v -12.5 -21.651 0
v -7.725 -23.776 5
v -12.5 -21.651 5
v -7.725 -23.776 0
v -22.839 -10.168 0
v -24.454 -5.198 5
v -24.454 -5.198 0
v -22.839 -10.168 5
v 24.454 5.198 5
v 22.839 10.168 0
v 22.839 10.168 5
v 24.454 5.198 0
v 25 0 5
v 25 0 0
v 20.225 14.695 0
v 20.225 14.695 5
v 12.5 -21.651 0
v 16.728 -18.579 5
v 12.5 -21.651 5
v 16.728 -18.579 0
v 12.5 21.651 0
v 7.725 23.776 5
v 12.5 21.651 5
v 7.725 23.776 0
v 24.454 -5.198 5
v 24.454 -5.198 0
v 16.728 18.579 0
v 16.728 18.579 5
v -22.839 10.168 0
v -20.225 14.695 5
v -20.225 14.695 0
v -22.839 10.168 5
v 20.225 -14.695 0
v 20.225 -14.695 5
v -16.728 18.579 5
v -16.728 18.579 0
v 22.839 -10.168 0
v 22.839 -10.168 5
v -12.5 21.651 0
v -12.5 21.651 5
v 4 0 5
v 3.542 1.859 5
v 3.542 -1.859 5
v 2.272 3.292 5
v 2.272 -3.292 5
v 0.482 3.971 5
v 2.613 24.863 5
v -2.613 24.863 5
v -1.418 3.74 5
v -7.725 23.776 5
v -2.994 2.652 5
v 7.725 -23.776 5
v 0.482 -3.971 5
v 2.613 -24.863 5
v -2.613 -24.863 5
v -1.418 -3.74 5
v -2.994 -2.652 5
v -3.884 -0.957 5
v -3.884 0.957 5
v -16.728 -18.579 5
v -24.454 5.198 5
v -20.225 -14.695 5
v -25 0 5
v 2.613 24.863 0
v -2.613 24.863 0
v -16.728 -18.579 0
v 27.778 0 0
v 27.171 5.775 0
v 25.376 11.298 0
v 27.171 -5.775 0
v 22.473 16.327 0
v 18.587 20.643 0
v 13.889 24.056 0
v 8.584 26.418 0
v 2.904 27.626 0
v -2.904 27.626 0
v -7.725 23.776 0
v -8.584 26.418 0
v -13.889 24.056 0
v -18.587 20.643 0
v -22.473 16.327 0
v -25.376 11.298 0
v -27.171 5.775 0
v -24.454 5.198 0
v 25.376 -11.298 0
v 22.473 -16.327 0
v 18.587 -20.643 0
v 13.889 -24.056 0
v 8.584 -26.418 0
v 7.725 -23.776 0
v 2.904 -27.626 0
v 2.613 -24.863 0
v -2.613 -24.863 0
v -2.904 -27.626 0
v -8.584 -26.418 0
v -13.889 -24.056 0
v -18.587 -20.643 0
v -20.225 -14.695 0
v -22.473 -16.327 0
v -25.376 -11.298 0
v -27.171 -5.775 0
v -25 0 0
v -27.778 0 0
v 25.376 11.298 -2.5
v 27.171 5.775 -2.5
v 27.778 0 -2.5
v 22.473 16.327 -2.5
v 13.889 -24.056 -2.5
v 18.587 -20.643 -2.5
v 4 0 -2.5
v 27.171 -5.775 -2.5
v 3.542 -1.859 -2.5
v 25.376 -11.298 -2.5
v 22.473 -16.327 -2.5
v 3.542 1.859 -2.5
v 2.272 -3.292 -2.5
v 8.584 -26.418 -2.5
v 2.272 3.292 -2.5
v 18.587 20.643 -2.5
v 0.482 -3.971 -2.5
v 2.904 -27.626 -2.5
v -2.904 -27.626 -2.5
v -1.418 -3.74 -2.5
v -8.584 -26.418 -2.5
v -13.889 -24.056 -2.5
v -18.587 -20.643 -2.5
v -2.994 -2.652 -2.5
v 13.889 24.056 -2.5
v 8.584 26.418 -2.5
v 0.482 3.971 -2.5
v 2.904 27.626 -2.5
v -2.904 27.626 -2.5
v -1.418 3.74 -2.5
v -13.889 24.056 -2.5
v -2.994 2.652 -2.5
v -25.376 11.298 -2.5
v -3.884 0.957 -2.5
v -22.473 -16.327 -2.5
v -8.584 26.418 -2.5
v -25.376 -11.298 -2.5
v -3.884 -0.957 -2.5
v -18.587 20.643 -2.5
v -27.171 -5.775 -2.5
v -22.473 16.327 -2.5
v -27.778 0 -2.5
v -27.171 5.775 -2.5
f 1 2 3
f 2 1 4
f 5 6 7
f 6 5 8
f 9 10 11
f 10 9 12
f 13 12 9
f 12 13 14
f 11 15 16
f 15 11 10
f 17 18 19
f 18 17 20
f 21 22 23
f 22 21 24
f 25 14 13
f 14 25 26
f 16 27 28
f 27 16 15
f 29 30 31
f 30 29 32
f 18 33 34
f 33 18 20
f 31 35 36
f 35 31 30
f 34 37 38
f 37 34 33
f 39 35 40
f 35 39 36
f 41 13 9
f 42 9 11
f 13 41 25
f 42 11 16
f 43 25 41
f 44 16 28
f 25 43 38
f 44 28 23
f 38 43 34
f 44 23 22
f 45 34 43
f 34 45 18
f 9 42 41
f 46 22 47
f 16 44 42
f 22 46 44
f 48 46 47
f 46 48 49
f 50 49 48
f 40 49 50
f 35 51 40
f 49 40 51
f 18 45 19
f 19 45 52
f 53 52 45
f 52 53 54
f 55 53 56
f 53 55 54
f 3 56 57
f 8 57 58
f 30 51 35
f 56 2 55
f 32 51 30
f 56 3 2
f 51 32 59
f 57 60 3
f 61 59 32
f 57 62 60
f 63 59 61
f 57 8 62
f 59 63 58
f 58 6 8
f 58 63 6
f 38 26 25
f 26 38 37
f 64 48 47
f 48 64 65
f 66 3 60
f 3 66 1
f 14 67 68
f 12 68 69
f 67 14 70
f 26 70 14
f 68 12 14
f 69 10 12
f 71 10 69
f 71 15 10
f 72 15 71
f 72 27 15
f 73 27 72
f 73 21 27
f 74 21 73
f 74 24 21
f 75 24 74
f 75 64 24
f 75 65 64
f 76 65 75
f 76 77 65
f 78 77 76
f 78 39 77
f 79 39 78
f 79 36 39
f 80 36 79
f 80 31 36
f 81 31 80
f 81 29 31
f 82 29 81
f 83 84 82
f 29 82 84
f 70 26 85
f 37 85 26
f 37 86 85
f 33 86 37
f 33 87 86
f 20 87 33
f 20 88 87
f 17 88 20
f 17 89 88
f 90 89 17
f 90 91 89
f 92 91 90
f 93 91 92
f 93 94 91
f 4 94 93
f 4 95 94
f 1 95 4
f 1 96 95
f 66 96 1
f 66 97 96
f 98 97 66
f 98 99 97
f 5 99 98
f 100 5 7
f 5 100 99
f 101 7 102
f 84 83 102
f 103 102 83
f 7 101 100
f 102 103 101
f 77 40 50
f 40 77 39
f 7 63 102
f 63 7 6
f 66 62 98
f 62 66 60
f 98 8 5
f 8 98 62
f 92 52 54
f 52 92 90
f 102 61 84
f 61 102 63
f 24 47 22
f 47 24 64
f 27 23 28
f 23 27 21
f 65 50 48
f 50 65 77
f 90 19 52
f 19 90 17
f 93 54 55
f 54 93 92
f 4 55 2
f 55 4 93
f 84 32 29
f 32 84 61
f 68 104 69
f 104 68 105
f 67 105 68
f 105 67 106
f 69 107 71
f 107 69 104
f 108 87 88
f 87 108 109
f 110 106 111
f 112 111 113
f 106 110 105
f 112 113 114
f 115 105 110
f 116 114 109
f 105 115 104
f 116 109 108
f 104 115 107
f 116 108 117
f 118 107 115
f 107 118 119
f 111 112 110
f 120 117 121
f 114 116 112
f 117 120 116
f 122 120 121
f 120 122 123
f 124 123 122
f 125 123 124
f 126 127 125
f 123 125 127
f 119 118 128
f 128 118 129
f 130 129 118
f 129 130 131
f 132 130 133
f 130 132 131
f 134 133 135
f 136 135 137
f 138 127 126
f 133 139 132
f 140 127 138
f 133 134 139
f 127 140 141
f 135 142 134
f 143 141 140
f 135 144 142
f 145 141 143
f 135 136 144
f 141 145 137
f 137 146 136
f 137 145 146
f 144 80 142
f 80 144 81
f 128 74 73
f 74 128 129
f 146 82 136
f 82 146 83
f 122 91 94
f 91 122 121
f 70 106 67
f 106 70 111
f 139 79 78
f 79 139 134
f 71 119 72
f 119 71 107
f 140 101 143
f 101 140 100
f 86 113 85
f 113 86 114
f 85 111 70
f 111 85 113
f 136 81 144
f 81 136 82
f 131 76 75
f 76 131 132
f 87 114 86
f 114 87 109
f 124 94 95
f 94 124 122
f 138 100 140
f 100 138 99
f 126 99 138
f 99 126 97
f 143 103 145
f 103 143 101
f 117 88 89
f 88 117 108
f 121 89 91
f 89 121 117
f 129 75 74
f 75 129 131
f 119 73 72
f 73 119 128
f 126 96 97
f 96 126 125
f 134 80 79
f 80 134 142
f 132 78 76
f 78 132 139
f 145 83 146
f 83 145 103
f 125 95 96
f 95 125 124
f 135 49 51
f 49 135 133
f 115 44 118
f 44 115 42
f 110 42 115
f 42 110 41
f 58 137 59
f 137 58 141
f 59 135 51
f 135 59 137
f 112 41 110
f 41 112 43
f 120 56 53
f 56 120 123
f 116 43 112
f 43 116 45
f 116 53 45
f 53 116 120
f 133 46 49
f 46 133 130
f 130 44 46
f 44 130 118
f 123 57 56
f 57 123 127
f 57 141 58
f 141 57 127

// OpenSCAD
spool_diameter = 50;
spool_thickness = 55.5;
axis_diameter = 8;
bearing_thickness = 5;

module spool() {
	difference() {
		cylinder(r = spool_diameter * 2, h = spool_thickness);

		translate([0, 0, -1])
		cylinder(r = spool_diameter / 2, h = spool_thickness + 2);
	}

	* difference() {
		translate([0, 0, spool_thickness])
		cylinder(r = spool_diameter * 2, h = spool_thickness / 2);

		translate([0, 0, spool_thickness])
		cylinder(r = spool_diameter / 1.25, h = spool_thickness / 2 + 1);
	}
}

module bearing() {
	difference() {
		union() {
			cylinder(r = spool_diameter / 2, h = bearing_thickness);
			translate([0, 0, -bearing_thickness / 2])
			cylinder(r = spool_diameter / 1.8, h = bearing_thickness / 2);
		}

		translate([0, 0, -bearing_thickness - 1])
		cylinder(r = axis_diameter / 2, h = bearing_thickness * 2 + 2);
	}
}

% * spool();

bearing();

translate([0, 0, spool_thickness])
mirror([0, 0, 1])
* bearing();
